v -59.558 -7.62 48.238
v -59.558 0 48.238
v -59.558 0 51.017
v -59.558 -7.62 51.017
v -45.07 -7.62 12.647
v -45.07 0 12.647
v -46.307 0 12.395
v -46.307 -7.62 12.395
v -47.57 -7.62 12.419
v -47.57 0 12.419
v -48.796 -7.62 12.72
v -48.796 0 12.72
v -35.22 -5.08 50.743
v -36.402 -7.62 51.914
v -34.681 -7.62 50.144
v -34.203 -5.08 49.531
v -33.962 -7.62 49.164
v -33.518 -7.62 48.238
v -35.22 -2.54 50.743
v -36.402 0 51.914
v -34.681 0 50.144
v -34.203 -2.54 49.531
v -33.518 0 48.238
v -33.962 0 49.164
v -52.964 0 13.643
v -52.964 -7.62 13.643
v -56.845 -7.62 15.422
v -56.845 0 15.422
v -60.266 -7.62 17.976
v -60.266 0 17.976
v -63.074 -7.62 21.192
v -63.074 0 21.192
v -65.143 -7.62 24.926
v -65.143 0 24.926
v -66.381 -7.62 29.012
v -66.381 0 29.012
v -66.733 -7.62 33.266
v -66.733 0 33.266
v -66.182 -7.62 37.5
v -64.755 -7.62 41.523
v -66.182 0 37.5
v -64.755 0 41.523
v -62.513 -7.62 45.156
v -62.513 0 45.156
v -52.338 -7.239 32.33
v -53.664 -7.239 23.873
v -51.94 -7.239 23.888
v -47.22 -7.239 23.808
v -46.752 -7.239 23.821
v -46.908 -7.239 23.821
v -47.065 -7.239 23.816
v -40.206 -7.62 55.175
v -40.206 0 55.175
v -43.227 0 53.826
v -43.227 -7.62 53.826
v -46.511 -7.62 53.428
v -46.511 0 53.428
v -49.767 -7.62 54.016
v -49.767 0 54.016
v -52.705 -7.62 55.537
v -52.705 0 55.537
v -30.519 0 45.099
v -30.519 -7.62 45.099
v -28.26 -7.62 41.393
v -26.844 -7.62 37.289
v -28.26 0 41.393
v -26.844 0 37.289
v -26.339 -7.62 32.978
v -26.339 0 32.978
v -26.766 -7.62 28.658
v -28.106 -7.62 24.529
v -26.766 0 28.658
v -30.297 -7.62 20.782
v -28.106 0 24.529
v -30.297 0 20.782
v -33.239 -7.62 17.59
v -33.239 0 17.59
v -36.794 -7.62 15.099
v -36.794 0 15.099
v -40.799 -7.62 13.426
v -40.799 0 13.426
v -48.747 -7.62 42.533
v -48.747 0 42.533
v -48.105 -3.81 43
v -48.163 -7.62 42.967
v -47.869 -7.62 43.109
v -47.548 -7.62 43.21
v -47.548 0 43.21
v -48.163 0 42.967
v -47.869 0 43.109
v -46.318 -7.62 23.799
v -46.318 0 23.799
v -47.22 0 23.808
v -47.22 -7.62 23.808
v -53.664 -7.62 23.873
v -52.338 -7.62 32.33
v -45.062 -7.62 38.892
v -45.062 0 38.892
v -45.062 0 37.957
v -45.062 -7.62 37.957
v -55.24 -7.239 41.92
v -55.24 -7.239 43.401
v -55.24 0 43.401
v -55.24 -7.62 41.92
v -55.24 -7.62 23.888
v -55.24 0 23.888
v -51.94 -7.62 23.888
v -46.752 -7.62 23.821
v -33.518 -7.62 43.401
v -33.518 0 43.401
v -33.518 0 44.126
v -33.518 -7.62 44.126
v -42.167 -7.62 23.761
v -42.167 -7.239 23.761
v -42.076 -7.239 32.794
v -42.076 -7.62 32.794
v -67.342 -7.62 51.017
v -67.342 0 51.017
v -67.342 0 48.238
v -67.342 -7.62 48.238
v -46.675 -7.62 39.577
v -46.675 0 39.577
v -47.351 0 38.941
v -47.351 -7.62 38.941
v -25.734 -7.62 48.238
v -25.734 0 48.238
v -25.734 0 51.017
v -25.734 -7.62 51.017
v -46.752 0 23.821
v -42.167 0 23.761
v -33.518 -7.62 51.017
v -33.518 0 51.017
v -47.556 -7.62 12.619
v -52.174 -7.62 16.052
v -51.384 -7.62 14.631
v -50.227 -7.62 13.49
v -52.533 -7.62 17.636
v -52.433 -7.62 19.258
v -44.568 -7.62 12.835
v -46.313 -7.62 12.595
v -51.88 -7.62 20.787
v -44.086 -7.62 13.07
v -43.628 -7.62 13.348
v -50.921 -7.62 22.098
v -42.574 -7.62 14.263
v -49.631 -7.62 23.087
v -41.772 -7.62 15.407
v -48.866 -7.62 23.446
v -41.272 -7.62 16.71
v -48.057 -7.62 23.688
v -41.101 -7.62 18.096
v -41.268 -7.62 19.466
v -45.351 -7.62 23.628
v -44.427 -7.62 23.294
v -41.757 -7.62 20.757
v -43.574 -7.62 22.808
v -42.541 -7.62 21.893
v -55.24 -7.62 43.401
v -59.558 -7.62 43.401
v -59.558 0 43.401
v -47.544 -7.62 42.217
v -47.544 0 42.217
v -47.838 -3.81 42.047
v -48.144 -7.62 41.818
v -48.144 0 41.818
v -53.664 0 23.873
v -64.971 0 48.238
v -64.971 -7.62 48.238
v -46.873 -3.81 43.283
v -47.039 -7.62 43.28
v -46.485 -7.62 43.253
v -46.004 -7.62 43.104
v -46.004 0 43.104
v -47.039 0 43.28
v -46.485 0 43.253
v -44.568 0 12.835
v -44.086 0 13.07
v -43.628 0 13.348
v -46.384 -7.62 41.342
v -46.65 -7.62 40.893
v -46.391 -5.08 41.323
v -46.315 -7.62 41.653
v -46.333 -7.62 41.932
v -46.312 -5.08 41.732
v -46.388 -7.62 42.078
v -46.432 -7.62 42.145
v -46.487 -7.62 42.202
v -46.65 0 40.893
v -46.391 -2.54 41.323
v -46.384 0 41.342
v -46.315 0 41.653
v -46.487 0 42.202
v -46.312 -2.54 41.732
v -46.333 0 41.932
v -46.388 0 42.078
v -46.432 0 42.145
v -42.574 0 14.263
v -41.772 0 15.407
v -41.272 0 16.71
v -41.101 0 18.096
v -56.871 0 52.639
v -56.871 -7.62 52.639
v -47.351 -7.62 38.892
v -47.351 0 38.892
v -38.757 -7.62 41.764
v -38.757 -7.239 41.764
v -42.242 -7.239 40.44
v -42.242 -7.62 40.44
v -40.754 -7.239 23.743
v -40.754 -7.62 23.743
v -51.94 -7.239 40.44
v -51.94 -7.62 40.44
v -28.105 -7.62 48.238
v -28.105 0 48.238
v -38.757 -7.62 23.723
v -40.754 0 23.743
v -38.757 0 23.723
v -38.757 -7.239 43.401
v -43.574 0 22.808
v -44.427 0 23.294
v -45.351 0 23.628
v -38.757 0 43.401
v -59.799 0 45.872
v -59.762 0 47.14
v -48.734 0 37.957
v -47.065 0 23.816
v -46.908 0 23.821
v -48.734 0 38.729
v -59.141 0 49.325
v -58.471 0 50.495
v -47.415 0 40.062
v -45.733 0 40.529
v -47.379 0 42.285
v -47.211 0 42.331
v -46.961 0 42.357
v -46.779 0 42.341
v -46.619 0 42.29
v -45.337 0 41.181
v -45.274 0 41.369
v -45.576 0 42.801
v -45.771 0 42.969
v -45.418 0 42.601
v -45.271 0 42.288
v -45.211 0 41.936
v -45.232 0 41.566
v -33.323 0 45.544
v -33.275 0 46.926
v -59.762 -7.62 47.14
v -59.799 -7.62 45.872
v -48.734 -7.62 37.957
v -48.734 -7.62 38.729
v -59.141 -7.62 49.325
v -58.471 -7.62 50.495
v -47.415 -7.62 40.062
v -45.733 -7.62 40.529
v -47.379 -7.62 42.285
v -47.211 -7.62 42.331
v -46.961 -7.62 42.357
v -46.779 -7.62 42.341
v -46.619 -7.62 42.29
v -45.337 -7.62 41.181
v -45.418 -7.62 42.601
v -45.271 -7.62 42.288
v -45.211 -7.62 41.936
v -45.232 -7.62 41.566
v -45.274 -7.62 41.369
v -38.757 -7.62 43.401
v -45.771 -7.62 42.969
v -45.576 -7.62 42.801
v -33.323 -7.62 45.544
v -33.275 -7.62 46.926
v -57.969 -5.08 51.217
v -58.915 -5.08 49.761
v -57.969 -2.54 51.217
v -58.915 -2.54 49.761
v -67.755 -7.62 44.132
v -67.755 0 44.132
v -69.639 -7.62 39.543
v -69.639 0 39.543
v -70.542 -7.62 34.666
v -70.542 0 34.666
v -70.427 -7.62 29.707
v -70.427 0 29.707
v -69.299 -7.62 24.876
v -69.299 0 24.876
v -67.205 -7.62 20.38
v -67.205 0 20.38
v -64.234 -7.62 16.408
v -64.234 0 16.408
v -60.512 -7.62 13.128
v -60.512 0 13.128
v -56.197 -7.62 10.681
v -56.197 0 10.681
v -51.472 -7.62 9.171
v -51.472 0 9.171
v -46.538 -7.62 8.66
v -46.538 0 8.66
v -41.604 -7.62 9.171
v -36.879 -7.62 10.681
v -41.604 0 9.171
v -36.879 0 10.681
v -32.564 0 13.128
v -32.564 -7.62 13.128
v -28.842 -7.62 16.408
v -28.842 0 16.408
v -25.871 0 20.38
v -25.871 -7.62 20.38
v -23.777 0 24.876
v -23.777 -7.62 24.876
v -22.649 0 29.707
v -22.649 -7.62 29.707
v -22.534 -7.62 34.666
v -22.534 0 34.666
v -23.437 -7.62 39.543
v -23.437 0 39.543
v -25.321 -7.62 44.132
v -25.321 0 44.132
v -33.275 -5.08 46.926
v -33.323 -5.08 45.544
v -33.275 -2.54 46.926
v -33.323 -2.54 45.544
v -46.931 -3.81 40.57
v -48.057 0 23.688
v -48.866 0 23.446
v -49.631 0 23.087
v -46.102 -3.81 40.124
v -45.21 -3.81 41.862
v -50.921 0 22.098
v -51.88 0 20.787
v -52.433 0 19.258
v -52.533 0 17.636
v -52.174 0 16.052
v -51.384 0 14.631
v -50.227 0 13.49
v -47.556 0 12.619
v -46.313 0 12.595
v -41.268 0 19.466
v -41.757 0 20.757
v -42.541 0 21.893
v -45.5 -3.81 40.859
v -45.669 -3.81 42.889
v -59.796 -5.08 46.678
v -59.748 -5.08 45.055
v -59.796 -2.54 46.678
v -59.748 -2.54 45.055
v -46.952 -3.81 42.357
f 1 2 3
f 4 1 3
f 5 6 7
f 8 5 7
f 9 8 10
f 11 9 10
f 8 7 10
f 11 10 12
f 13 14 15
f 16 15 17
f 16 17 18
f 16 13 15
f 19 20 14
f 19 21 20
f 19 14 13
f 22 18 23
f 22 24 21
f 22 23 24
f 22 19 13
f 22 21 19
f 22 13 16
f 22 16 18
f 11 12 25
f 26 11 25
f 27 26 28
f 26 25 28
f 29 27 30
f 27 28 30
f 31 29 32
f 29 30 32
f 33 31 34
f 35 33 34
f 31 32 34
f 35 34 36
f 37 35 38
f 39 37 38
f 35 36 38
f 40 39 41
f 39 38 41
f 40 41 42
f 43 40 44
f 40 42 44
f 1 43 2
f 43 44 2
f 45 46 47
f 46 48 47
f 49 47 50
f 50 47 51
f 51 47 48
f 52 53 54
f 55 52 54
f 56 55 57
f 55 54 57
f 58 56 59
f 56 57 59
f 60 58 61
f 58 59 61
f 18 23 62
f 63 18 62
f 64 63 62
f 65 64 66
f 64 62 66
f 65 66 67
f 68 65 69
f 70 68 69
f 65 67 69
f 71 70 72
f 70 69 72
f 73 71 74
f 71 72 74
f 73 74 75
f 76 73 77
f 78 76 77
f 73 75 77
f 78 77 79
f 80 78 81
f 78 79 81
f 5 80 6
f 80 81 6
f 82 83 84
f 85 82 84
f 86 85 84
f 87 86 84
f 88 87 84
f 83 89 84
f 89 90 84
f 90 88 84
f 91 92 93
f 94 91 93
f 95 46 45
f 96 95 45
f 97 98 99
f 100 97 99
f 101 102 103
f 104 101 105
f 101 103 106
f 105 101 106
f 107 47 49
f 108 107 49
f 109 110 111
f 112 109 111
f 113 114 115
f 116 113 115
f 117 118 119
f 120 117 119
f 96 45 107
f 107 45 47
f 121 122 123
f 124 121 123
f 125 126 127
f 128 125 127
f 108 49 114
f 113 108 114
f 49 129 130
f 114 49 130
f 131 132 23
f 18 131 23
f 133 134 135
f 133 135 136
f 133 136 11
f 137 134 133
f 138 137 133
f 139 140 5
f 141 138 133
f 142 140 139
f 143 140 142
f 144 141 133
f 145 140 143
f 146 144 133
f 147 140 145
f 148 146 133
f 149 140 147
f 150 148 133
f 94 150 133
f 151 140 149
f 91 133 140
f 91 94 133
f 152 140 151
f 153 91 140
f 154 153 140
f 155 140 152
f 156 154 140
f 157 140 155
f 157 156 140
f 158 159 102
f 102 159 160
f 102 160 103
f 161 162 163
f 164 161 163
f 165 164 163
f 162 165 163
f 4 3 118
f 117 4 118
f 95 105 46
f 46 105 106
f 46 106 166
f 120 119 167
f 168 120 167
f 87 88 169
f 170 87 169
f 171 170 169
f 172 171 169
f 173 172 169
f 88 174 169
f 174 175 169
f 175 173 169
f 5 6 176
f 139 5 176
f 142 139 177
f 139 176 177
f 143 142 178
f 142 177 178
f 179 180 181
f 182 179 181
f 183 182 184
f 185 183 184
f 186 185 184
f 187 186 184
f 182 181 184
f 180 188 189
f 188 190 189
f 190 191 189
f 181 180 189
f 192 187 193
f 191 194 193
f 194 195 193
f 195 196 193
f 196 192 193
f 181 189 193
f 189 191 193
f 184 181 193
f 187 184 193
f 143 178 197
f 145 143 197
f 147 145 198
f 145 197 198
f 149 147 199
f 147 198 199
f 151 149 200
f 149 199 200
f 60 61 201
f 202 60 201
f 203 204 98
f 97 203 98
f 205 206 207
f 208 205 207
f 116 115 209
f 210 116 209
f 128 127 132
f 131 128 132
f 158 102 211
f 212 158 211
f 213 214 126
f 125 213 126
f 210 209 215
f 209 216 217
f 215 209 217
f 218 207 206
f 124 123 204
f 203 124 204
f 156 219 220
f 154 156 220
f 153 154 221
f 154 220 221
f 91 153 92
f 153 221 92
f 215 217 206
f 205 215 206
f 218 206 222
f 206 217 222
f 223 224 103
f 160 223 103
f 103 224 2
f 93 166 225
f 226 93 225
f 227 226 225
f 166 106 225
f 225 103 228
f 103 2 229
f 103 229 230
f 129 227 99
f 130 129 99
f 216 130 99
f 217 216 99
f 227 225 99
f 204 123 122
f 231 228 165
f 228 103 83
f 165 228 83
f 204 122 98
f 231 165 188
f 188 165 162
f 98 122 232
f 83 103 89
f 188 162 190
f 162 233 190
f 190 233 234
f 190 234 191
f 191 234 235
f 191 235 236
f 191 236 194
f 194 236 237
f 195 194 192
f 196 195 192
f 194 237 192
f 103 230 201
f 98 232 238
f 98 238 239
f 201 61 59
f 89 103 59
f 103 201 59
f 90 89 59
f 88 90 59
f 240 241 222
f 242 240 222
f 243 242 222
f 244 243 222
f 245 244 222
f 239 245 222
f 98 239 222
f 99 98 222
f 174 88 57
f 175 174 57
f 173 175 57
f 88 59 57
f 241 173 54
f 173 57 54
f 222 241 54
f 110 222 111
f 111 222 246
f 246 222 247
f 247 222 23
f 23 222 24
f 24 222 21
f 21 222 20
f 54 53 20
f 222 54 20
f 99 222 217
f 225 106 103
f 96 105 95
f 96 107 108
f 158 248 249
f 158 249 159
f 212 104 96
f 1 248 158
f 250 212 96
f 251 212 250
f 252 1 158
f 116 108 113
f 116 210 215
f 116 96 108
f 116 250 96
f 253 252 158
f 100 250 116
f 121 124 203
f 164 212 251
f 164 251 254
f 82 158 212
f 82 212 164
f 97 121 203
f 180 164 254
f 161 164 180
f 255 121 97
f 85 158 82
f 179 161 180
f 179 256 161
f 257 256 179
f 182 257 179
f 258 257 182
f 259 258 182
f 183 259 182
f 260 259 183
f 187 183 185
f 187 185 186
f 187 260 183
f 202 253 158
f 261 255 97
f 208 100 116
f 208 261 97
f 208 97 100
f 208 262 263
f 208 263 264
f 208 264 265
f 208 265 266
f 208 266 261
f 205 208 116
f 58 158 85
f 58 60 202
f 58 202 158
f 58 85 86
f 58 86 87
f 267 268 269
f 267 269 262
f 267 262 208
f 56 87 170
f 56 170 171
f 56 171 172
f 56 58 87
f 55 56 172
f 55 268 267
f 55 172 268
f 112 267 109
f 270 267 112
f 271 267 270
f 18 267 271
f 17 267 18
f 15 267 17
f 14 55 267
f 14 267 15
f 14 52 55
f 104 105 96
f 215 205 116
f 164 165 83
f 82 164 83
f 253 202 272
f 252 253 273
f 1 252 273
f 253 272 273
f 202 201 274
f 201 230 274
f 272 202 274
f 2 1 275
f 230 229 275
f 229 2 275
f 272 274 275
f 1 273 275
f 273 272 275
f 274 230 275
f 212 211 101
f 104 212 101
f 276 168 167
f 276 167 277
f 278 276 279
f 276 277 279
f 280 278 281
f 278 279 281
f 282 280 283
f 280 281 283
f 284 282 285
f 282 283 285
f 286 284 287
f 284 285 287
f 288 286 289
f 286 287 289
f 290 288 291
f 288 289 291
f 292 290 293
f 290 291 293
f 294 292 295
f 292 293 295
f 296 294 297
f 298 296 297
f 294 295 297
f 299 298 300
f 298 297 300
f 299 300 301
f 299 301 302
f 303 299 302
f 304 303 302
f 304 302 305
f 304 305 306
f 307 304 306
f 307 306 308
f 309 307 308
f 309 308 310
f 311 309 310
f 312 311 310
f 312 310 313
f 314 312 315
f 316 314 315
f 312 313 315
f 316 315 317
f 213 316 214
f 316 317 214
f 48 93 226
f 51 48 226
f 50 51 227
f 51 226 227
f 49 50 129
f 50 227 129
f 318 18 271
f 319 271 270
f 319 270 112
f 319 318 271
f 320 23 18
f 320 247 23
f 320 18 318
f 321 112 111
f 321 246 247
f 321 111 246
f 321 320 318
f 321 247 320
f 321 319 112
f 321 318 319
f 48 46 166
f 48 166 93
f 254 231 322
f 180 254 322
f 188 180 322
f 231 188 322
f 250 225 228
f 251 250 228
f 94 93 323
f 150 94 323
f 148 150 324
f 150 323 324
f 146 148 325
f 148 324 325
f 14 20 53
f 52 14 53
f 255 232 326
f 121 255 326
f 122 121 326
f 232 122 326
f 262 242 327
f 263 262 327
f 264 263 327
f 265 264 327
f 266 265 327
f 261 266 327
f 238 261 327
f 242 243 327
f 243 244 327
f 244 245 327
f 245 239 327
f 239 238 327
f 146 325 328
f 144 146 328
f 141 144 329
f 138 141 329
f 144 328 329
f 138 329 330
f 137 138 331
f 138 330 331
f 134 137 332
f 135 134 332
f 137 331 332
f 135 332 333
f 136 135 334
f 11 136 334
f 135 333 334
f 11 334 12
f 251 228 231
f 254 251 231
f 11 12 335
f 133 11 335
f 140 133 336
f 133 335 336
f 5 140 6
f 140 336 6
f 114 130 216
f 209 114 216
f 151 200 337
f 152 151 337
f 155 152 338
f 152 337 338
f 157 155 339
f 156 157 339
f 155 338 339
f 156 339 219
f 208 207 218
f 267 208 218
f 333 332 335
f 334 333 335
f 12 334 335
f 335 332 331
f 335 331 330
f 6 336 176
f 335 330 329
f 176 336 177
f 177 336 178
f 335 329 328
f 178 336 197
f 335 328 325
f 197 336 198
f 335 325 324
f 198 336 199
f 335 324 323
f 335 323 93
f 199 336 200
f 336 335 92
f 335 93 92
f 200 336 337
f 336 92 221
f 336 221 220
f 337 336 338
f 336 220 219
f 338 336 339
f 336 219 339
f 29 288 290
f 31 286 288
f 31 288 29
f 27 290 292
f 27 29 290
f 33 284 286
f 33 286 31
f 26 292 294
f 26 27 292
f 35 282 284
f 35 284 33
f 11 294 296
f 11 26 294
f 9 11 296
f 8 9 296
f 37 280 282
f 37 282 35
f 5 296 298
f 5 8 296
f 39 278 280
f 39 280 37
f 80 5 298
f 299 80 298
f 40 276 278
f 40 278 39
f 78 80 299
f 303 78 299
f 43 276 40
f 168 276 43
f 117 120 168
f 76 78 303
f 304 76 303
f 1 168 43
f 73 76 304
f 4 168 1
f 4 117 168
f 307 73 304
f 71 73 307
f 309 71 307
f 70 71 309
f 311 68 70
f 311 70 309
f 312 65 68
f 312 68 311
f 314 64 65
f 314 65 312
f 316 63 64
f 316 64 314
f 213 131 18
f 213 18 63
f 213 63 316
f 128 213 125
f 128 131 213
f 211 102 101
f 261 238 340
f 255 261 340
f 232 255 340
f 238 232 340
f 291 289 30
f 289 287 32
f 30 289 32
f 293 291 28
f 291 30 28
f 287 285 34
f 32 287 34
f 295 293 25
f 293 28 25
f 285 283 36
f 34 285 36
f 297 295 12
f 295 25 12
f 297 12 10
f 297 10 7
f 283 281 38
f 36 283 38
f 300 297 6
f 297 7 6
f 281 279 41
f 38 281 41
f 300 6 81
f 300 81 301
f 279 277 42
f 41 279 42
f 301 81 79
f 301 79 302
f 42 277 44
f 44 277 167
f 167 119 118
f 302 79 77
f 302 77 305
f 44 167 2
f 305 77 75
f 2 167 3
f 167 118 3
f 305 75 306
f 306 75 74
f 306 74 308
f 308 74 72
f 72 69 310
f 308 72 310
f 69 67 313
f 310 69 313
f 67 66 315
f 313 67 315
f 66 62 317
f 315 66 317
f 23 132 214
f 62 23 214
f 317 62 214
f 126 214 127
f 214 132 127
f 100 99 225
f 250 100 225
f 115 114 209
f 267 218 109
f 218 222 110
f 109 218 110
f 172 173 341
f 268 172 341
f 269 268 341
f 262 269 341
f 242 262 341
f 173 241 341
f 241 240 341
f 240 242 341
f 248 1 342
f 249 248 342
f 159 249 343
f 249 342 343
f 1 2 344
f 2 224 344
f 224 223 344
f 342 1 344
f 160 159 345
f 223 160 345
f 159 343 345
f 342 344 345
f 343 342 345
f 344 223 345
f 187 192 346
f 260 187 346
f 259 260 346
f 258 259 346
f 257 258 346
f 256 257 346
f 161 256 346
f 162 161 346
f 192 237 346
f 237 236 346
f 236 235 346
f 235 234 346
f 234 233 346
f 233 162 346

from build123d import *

# Parameters (mm, degrees)
F1_DEPTH = 7.62
F2_DEPTH = 7.239


# Not quite as in the source:
# - the program builds the solid bodies; features that only make, move or delete a surface that nothing else refers to are left out


with BuildPart() as f1:
    # F0 (on Front) → F1 (new body)
    with BuildSketch(Plane.XZ):
        with BuildLine():
            Line((-59.5584991262, 48.2375602462), (-64.9708399911, 48.2375602462))
            ThreePointArc((-64.9708399911, 48.2375602462), (-46.5380060703, 8.6596191309), (-28.1051721496, 48.2375602462))
            Line((-28.1051721496, 48.2375602462), (-33.5175130144, 48.2375602462))
            ThreePointArc((-33.5175130144, 48.2375602462), (-27.3247565054, 26.5574116364), (-45.0697709813, 12.6472161608))
            ThreePointArc((-45.0697709813, 12.6472161608), (-46.9391212719, 12.3720803787), (-48.7962257348, 12.7204095643))
            ThreePointArc((-48.7962257348, 12.7204095643), (-65.87002003, 26.9359197848), (-59.5584991262, 48.2375602462))
        make_face()
        Polygon((-67.3419212263, 48.2375602462), (-64.9708399911, 48.2375602462), (-59.5584991262, 48.2375602462), (-59.5584991262, 51.0173538534), (-67.3419212263, 51.0173538534), align=None)
        Polygon((-33.5175130144, 48.2375602462), (-28.1051721496, 48.2375602462), (-25.7340909143, 48.2375602462), (-25.7340909143, 51.0173538534), (-33.5175130144, 51.0173538534), align=None)
    extrude(amount=F1_DEPTH)


with BuildPart() as f1b:
    # F0 (on Front) → F1, piece 2 (new body)
    with BuildSketch(Plane.XZ):
        with BuildLine():
            add(Edge.make_bspline(
                [(-56.8707543748, 52.6390547806), (-57.9942418052, 51.2220877516), (-59.1177292355, 49.8051207226), (-59.5584991262, 48.2375602462)],
                knots=[0, 0, 0, 0, 0.5080226009, 0.5080226009, 0.5080226009, 0.5080226009], degree=3))
            add(Edge.make_bspline(
                [(-59.5584991262, 48.2375602462), (-59.9853479003, 46.7195090321), (-59.7719235132, 45.0602267275), (-59.5584991262, 43.4009444229)],
                knots=[0.5080226009, 0.5080226009, 0.5080226009, 0.5080226009, 1, 1, 1, 1], degree=3))
            Line((-59.5584991262, 43.4009444229), (-55.2404991262, 43.4009444229))
            Line((-55.2404991262, 43.4009444229), (-51.9395383562, 40.4397919774))
            Line((-51.9395383562, 40.4397919774), (-55.2404991262, 41.9203682002))
            Line((-55.2404991262, 41.9203682002), (-55.2404991262, 23.888412863))
            Line((-55.2404991262, 23.888412863), (-53.664046478, 23.8725836956))
            Line((-53.664046478, 23.8725836956), (-52.338115871, 32.3296152055))
            Line((-52.338115871, 32.3296152055), (-51.9395383562, 23.888412863))
            Line((-51.9395383562, 23.888412863), (-46.7522454605, 23.8209567953))
            Line((-46.7522454605, 23.8209567953), (-42.1669552674, 23.7613292301))
            Line((-42.1669552674, 23.7613292301), (-42.0762598515, 32.7938339318))
            Line((-42.0762598515, 32.7938339318), (-40.753610712, 23.7429499583))
            Line((-40.753610712, 23.7429499583), (-38.7568103386, 23.7229000777))
            Line((-38.7568103386, 23.7229000777), (-38.7568103386, 41.7639017105))
            Line((-38.7568103386, 41.7639017105), (-42.2417744994, 40.4397919774))
            Line((-42.2417744994, 40.4397919774), (-38.7568103386, 43.4009444229))
            Line((-38.7568103386, 43.4009444229), (-33.5175130144, 43.4009444229))
            Line((-33.5175130144, 43.4009444229), (-33.5175130144, 44.1255018582))
            add(Edge.make_bspline(
                [(-33.5175130144, 48.2375602462), (-33.0809784188, 46.9738387084), (-33.2992457166, 45.5496702833), (-33.5175130144, 44.1255018582)],
                knots=[0.5159883661, 0.5159883661, 0.5159883661, 0.5159883661, 1, 1, 1, 1], degree=3))
            add(Edge.make_bspline(
                [(-36.4019976546, 51.9144973453), (-35.1924426885, 50.7496341038), (-33.9828877223, 49.5847708622), (-33.5175130144, 48.2375602462)],
                knots=[0, 0, 0, 0, 0.5159883661, 0.5159883661, 0.5159883661, 0.5159883661], degree=3))
            Line((-36.4019976546, 51.9144973453), (-40.2059252092, 55.1750078426))
            ThreePointArc((-40.2059252092, 55.1750078426), (-46.5111214901, 53.4280963412), (-52.7045460642, 55.5372885988))
            Line((-52.7045460642, 55.5372885988), (-56.8707543748, 52.6390547806))
        make_face()
        with BuildLine():
            Line((-45.0624059546, 38.8915469496), (-45.0624059546, 37.9570834339))
            Line((-45.0624059546, 37.9570834339), (-48.7335947239, 37.9570834339))
            Line((-48.7335947239, 37.9570834339), (-48.7335947239, 38.7294813214))
            Line((-48.7335947239, 38.7294813214), (-47.4152310675, 40.0616377972))
            add(Edge.make_bspline(
                [(-47.4152310675, 40.0616377972), (-46.8290362421, 40.661625442), (-46.6497295897, 40.8932298681)],
                knots=[0, 0, 0, 1, 1, 1], degree=2))
            add(Edge.make_bspline(
                [(-46.6497295897, 40.8932298681), (-46.4704229372, 41.1248342942), (-46.3911142255, 41.3225313726)],
                knots=[0, 0, 0, 1, 1, 1], degree=2))
            add(Edge.make_bspline(
                [(-46.3911142255, 41.3225313726), (-46.3118055138, 41.520228451), (-46.3118055138, 41.7317183488)],
                knots=[0, 0, 0, 1, 1, 1], degree=2))
            add(Edge.make_bspline(
                [(-46.3118055138, 41.7317183488), (-46.3118055138, 42.0478037938), (-46.4865145598, 42.2023983115)],
                knots=[0, 0, 0, 1, 1, 1], degree=2))
            add(Edge.make_bspline(
                [(-46.4865145598, 42.2023983115), (-46.6612236059, 42.3569928292), (-46.9520222153, 42.3569928292)],
                knots=[0, 0, 0, 1, 1, 1], degree=2))
            add(Edge.make_bspline(
                [(-46.9520222153, 42.3569928292), (-47.2566136442, 42.3569928292), (-47.5439640488, 42.2167658318)],
                knots=[0, 0, 0, 1, 1, 1], degree=2))
            add(Edge.make_bspline(
                [(-47.5439640488, 42.2167658318), (-47.8313144534, 42.0765388343), (-48.1439516936, 41.8179234702)],
                knots=[0, 0, 0, 1, 1, 1], degree=2))
            Line((-48.1439516936, 41.8179234702), (-48.7473875433, 42.5328512768))
            add(Edge.make_bspline(
                [(-48.7473875433, 42.5328512768), (-48.3600391979, 42.8638789429), (-48.1048720386, 43.0000830347)],
                knots=[0, 0, 0, 1, 1, 1], degree=2))
            add(Edge.make_bspline(
                [(-48.1048720386, 43.0000830347), (-47.8497048793, 43.1362871265), (-47.5479869545, 43.2098488301)],
                knots=[0, 0, 0, 1, 1, 1], degree=2))
            add(Edge.make_bspline(
                [(-47.5479869545, 43.2098488301), (-47.2462690296, 43.2834105337), (-46.8727135036, 43.2834105337)],
                knots=[0, 0, 0, 1, 1, 1], degree=2))
            add(Edge.make_bspline(
                [(-46.8727135036, 43.2834105337), (-46.380769611, 43.2834105337), (-46.0037658801, 43.1041038812)],
                knots=[0, 0, 0, 1, 1, 1], degree=2))
            add(Edge.make_bspline(
                [(-46.0037658801, 43.1041038812), (-45.6267621493, 42.9247972287), (-45.4181457555, 42.6012406731)],
                knots=[0, 0, 0, 1, 1, 1], degree=2))
            add(Edge.make_bspline(
                [(-45.4181457555, 42.6012406731), (-45.2095293618, 42.2776841175), (-45.2095293618, 41.8616007317)],
                knots=[0, 0, 0, 1, 1, 1], degree=2))
            add(Edge.make_bspline(
                [(-45.2095293618, 41.8616007317), (-45.2095293618, 41.4983898202), (-45.3371129414, 41.1805802727)],
                knots=[0, 0, 0, 1, 1, 1], degree=2))
            add(Edge.make_bspline(
                [(-45.3371129414, 41.1805802727), (-45.4646965211, 40.8627707252), (-45.7325070982, 40.5288695551)],
                knots=[0, 0, 0, 1, 1, 1], degree=2))
            add(Edge.make_bspline(
                [(-45.7325070982, 40.5288695551), (-46.0003176753, 40.1949683849), (-46.6750164253, 39.5765903142)],
                knots=[0, 0, 0, 1, 1, 1], degree=2))
            Line((-46.6750164253, 39.5765903142), (-47.3508645769, 38.9409712192))
            Line((-47.3508645769, 38.9409712192), (-47.3508645769, 38.8915469496))
            Line((-47.3508645769, 38.8915469496), (-45.0624059546, 38.8915469496))
        make_face(mode=Mode.SUBTRACT)
    extrude(amount=F1_DEPTH)

    # F0 (on Front) → F2 (join)
    with BuildSketch(Plane.XZ):
        with BuildLine():
            Line((-53.664046478, 23.8725836956), (-47.2204577548, 23.8078835954))
            ThreePointArc((-47.2204577548, 23.8078835954), (-46.9864853573, 23.8192103943), (-46.7522454605, 23.8209567953))
            Line((-46.7522454605, 23.8209567953), (-51.9395383562, 23.888412863))
            Line((-51.9395383562, 23.888412863), (-52.338115871, 32.3296152055))
            Line((-52.338115871, 32.3296152055), (-53.664046478, 23.8725836956))
        make_face()
        Polygon((-42.1669552674, 23.7613292301), (-40.753610712, 23.7429499583), (-42.0762598515, 32.7938339318), align=None)
        Polygon((-51.9395383562, 40.4397919774), (-55.2404991262, 43.4009444229), (-55.2404991262, 41.9203682002), align=None)
        Polygon((-38.7568103386, 41.7639017105), (-38.7568103386, 43.4009444229), (-42.2417744994, 40.4397919774), align=None)
    extrude(amount=F2_DEPTH)


with BuildPart() as f1c:
    # F0 (on Front) → F1, piece 3 (new body)
    with BuildSketch(Plane.XZ):
        with BuildLine():
            ThreePointArc((-49.9709981221, 13.3116904732), (-49.4006466899, 12.9822049089), (-48.7962257348, 12.7204095643))
            ThreePointArc((-48.7962257348, 12.7204095643), (-46.9346901082, 12.5976817324), (-45.0697709813, 12.6472161608))
            ThreePointArc((-45.0697709813, 12.6472161608), (-44.3242339331, 12.9468400942), (-43.6279851846, 13.3478858171))
            ThreePointArc((-43.6279851846, 13.3478858171), (-43.7477560192, 13.547239909), (-43.8622818599, 13.7496527016))
            ThreePointArc((-43.8622818599, 13.7496527016), (-44.0069124158, 14.0244973728), (-44.141874165, 14.3042167273))
            ThreePointArc((-44.141874165, 14.3042167273), (-44.2788871247, 14.6169348112), (-44.4038162039, 14.9346735031))
            ThreePointArc((-44.4038162039, 14.9346735031), (-44.524631527, 15.2819339234), (-44.6310139513, 15.6338840926))
            ThreePointArc((-44.6310139513, 15.6338840926), (-44.7241488842, 15.9957276415), (-44.8020281543, 16.3611584679))
            ThreePointArc((-44.8020281543, 16.3611584679), (-44.8689286768, 16.7596883146), (-44.917686063, 17.1608421952))
            ThreePointArc((-44.917686063, 17.1608421952), (-44.9461032037, 17.5257356006), (-44.9595074387, 17.8914883281))
            ThreePointArc((-44.9595074387, 17.8914883281), (-44.9587241846, 18.2204976343), (-44.945791906, 18.5492536124))
            ThreePointArc((-44.945791906, 18.5492536124), (-44.9154647205, 18.9309840033), (-44.8687597947, 19.311058311))
            ThreePointArc((-44.8687597947, 19.311058311), (-44.7993413756, 19.7224063942), (-44.7107409222, 20.13005345))
            ThreePointArc((-44.7107409222, 20.13005345), (-44.6269832671, 20.4500506858), (-44.5314031498, 20.7667177299))
            ThreePointArc((-44.5314031498, 20.7667177299), (-44.4182724978, 21.0956811982), (-44.292384048, 21.4199767518))
            ThreePointArc((-44.292384048, 21.4199767518), (-44.1668612228, 21.7106973118), (-44.0310848775, 21.9967728398))
            ThreePointArc((-44.0310848775, 21.9967728398), (-43.9091335777, 22.2334098214), (-43.7801657509, 22.4662970908))
            ThreePointArc((-43.7801657509, 22.4662970908), (-43.6790232251, 22.6381795939), (-43.5740581992, 22.8077547948))
            ThreePointArc((-43.5740581992, 22.8077547948), (-44.8819912009, 23.4810418249), (-46.3183121682, 23.7988251479))
            Line((-46.3183121682, 23.7988251479), (-47.2204577548, 23.8078835954))
            ThreePointArc((-47.2204577548, 23.8078835954), (-48.4659781229, 23.5817368193), (-49.631357065, 23.0874137743))
            ThreePointArc((-49.631357065, 23.0874137743), (-49.4399703042, 22.8012645954), (-49.2608678419, 22.507270458))
            ThreePointArc((-49.2608678419, 22.507270458), (-49.0909371231, 22.1994140873), (-48.934476517, 21.8844981097))
            ThreePointArc((-48.934476517, 21.8844981097), (-48.7796011354, 21.533843634), (-48.6414253274, 21.1762791067))
            ThreePointArc((-48.6414253274, 21.1762791067), (-48.5264267045, 20.8325949559), (-48.4268576249, 20.4841276301))
            ThreePointArc((-48.4268576249, 20.4841276301), (-48.3512675692, 20.1700219292), (-48.2882156381, 19.8531612313))
            ThreePointArc((-48.2882156381, 19.8531612313), (-48.2364890834, 19.5244720475), (-48.1982539758, 19.1939417273))
            ThreePointArc((-48.1982539758, 19.1939417273), (-48.1743949079, 18.8771098565), (-48.1629326852, 18.5595877205))
            ThreePointArc((-48.1629326852, 18.5595877205), (-48.1640132648, 18.2362473997), (-48.1779489959, 17.9132057212))
            ThreePointArc((-48.1779489959, 17.9132057212), (-48.200015614, 17.6379014311), (-48.2314197618, 17.3635054266))
            ThreePointArc((-48.2314197618, 17.3635054266), (-48.2744314156, 17.0765495957), (-48.3276546289, 16.7913112028))
            ThreePointArc((-48.3276546289, 16.7913112028), (-48.4096419855, 16.4329658061), (-48.5077428192, 16.0786924987))
            ThreePointArc((-48.5077428192, 16.0786924987), (-48.5962780883, 15.8028375106), (-48.6945848527, 15.5303118267))
            ThreePointArc((-48.6945848527, 15.5303118267), (-48.807250429, 15.2503283661), (-48.9302291917, 14.9747190516))
            ThreePointArc((-48.9302291917, 14.9747190516), (-49.0672773505, 14.6962471277), (-49.2148536279, 14.4232085726))
            ThreePointArc((-49.2148536279, 14.4232085726), (-49.341263487, 14.2074529376), (-49.4742483135, 13.9956865985))
            ThreePointArc((-49.4742483135, 13.9956865985), (-49.6022091028, 13.8046791412), (-49.7355192028, 13.6173659555))
            ThreePointArc((-49.7355192028, 13.6173659555), (-49.8514451058, 13.4631311302), (-49.9709981221, 13.3116904732))
        make_face()
        with BuildLine():
            ThreePointArc((-49.631357065, 23.0874137743), (-52.5484703481, 18.2950021878), (-49.9709981221, 13.3116904732))
            ThreePointArc((-49.9709981221, 13.3116904732), (-49.8514451058, 13.4631311302), (-49.7355192028, 13.6173659555))
            ThreePointArc((-49.7355192028, 13.6173659555), (-49.6022091028, 13.8046791412), (-49.4742483135, 13.9956865985))
            ThreePointArc((-49.4742483135, 13.9956865985), (-49.341263487, 14.2074529376), (-49.2148536279, 14.4232085726))
            ThreePointArc((-49.2148536279, 14.4232085726), (-49.0672773505, 14.6962471277), (-48.9302291917, 14.9747190516))
            ThreePointArc((-48.9302291917, 14.9747190516), (-48.807250429, 15.2503283661), (-48.6945848527, 15.5303118267))
            ThreePointArc((-48.6945848527, 15.5303118267), (-48.5962780883, 15.8028375106), (-48.5077428192, 16.0786924987))
            ThreePointArc((-48.5077428192, 16.0786924987), (-48.4096419855, 16.4329658061), (-48.3276546289, 16.7913112028))
            ThreePointArc((-48.3276546289, 16.7913112028), (-48.2744314156, 17.0765495957), (-48.2314197618, 17.3635054266))
            ThreePointArc((-48.2314197618, 17.3635054266), (-48.200015614, 17.6379014311), (-48.1779489959, 17.9132057212))
            ThreePointArc((-48.1779489959, 17.9132057212), (-48.1640132648, 18.2362473997), (-48.1629326852, 18.5595877205))
            ThreePointArc((-48.1629326852, 18.5595877205), (-48.1743949079, 18.8771098565), (-48.1982539758, 19.1939417273))
            ThreePointArc((-48.1982539758, 19.1939417273), (-48.2364890834, 19.5244720475), (-48.2882156381, 19.8531612313))
            ThreePointArc((-48.2882156381, 19.8531612313), (-48.3512675692, 20.1700219292), (-48.4268576249, 20.4841276301))
            ThreePointArc((-48.4268576249, 20.4841276301), (-48.5264267045, 20.8325949559), (-48.6414253274, 21.1762791067))
            ThreePointArc((-48.6414253274, 21.1762791067), (-48.7796011354, 21.533843634), (-48.934476517, 21.8844981097))
            ThreePointArc((-48.934476517, 21.8844981097), (-49.0909371231, 22.1994140873), (-49.2608678419, 22.507270458))
            ThreePointArc((-49.2608678419, 22.507270458), (-49.4399703042, 22.8012645954), (-49.631357065, 23.0874137743))
        make_face()
        with BuildLine():
            ThreePointArc((-43.8622818599, 13.7496527016), (-43.7477560192, 13.547239909), (-43.6279851846, 13.3478858171))
            ThreePointArc((-43.6279851846, 13.3478858171), (-41.7724043969, 15.4068820932), (-41.1014581894, 18.0962085724))
            ThreePointArc((-41.1014581894, 18.0962085724), (-41.7571559778, 20.7566793303), (-43.5740581992, 22.8077547948))
            ThreePointArc((-43.5740581992, 22.8077547948), (-43.6790232251, 22.6381795939), (-43.7801657509, 22.4662970908))
            ThreePointArc((-43.7801657509, 22.4662970908), (-43.9091335777, 22.2334098214), (-44.0310848775, 21.9967728398))
            ThreePointArc((-44.0310848775, 21.9967728398), (-44.1668612228, 21.7106973118), (-44.292384048, 21.4199767518))
            ThreePointArc((-44.292384048, 21.4199767518), (-44.4182724978, 21.0956811982), (-44.5314031498, 20.7667177299))
            ThreePointArc((-44.5314031498, 20.7667177299), (-44.6269832671, 20.4500506858), (-44.7107409222, 20.13005345))
            ThreePointArc((-44.7107409222, 20.13005345), (-44.7993413756, 19.7224063942), (-44.8687597947, 19.311058311))
            ThreePointArc((-44.8687597947, 19.311058311), (-44.9154647205, 18.9309840033), (-44.945791906, 18.5492536124))
            ThreePointArc((-44.945791906, 18.5492536124), (-44.9587241846, 18.2204976343), (-44.9595074387, 17.8914883281))
            ThreePointArc((-44.9595074387, 17.8914883281), (-44.9461032037, 17.5257356006), (-44.917686063, 17.1608421952))
            ThreePointArc((-44.917686063, 17.1608421952), (-44.8689286768, 16.7596883146), (-44.8020281543, 16.3611584679))
            ThreePointArc((-44.8020281543, 16.3611584679), (-44.7241488842, 15.9957276415), (-44.6310139513, 15.6338840926))
            ThreePointArc((-44.6310139513, 15.6338840926), (-44.524631527, 15.2819339234), (-44.4038162039, 14.9346735031))
            ThreePointArc((-44.4038162039, 14.9346735031), (-44.2788871247, 14.6169348112), (-44.141874165, 14.3042167273))
            ThreePointArc((-44.141874165, 14.3042167273), (-44.0069124158, 14.0244973728), (-43.8622818599, 13.7496527016))
        make_face()
    extrude(amount=F1_DEPTH)


solid = Compound([f1.part, f1b.part, f1c.part])
